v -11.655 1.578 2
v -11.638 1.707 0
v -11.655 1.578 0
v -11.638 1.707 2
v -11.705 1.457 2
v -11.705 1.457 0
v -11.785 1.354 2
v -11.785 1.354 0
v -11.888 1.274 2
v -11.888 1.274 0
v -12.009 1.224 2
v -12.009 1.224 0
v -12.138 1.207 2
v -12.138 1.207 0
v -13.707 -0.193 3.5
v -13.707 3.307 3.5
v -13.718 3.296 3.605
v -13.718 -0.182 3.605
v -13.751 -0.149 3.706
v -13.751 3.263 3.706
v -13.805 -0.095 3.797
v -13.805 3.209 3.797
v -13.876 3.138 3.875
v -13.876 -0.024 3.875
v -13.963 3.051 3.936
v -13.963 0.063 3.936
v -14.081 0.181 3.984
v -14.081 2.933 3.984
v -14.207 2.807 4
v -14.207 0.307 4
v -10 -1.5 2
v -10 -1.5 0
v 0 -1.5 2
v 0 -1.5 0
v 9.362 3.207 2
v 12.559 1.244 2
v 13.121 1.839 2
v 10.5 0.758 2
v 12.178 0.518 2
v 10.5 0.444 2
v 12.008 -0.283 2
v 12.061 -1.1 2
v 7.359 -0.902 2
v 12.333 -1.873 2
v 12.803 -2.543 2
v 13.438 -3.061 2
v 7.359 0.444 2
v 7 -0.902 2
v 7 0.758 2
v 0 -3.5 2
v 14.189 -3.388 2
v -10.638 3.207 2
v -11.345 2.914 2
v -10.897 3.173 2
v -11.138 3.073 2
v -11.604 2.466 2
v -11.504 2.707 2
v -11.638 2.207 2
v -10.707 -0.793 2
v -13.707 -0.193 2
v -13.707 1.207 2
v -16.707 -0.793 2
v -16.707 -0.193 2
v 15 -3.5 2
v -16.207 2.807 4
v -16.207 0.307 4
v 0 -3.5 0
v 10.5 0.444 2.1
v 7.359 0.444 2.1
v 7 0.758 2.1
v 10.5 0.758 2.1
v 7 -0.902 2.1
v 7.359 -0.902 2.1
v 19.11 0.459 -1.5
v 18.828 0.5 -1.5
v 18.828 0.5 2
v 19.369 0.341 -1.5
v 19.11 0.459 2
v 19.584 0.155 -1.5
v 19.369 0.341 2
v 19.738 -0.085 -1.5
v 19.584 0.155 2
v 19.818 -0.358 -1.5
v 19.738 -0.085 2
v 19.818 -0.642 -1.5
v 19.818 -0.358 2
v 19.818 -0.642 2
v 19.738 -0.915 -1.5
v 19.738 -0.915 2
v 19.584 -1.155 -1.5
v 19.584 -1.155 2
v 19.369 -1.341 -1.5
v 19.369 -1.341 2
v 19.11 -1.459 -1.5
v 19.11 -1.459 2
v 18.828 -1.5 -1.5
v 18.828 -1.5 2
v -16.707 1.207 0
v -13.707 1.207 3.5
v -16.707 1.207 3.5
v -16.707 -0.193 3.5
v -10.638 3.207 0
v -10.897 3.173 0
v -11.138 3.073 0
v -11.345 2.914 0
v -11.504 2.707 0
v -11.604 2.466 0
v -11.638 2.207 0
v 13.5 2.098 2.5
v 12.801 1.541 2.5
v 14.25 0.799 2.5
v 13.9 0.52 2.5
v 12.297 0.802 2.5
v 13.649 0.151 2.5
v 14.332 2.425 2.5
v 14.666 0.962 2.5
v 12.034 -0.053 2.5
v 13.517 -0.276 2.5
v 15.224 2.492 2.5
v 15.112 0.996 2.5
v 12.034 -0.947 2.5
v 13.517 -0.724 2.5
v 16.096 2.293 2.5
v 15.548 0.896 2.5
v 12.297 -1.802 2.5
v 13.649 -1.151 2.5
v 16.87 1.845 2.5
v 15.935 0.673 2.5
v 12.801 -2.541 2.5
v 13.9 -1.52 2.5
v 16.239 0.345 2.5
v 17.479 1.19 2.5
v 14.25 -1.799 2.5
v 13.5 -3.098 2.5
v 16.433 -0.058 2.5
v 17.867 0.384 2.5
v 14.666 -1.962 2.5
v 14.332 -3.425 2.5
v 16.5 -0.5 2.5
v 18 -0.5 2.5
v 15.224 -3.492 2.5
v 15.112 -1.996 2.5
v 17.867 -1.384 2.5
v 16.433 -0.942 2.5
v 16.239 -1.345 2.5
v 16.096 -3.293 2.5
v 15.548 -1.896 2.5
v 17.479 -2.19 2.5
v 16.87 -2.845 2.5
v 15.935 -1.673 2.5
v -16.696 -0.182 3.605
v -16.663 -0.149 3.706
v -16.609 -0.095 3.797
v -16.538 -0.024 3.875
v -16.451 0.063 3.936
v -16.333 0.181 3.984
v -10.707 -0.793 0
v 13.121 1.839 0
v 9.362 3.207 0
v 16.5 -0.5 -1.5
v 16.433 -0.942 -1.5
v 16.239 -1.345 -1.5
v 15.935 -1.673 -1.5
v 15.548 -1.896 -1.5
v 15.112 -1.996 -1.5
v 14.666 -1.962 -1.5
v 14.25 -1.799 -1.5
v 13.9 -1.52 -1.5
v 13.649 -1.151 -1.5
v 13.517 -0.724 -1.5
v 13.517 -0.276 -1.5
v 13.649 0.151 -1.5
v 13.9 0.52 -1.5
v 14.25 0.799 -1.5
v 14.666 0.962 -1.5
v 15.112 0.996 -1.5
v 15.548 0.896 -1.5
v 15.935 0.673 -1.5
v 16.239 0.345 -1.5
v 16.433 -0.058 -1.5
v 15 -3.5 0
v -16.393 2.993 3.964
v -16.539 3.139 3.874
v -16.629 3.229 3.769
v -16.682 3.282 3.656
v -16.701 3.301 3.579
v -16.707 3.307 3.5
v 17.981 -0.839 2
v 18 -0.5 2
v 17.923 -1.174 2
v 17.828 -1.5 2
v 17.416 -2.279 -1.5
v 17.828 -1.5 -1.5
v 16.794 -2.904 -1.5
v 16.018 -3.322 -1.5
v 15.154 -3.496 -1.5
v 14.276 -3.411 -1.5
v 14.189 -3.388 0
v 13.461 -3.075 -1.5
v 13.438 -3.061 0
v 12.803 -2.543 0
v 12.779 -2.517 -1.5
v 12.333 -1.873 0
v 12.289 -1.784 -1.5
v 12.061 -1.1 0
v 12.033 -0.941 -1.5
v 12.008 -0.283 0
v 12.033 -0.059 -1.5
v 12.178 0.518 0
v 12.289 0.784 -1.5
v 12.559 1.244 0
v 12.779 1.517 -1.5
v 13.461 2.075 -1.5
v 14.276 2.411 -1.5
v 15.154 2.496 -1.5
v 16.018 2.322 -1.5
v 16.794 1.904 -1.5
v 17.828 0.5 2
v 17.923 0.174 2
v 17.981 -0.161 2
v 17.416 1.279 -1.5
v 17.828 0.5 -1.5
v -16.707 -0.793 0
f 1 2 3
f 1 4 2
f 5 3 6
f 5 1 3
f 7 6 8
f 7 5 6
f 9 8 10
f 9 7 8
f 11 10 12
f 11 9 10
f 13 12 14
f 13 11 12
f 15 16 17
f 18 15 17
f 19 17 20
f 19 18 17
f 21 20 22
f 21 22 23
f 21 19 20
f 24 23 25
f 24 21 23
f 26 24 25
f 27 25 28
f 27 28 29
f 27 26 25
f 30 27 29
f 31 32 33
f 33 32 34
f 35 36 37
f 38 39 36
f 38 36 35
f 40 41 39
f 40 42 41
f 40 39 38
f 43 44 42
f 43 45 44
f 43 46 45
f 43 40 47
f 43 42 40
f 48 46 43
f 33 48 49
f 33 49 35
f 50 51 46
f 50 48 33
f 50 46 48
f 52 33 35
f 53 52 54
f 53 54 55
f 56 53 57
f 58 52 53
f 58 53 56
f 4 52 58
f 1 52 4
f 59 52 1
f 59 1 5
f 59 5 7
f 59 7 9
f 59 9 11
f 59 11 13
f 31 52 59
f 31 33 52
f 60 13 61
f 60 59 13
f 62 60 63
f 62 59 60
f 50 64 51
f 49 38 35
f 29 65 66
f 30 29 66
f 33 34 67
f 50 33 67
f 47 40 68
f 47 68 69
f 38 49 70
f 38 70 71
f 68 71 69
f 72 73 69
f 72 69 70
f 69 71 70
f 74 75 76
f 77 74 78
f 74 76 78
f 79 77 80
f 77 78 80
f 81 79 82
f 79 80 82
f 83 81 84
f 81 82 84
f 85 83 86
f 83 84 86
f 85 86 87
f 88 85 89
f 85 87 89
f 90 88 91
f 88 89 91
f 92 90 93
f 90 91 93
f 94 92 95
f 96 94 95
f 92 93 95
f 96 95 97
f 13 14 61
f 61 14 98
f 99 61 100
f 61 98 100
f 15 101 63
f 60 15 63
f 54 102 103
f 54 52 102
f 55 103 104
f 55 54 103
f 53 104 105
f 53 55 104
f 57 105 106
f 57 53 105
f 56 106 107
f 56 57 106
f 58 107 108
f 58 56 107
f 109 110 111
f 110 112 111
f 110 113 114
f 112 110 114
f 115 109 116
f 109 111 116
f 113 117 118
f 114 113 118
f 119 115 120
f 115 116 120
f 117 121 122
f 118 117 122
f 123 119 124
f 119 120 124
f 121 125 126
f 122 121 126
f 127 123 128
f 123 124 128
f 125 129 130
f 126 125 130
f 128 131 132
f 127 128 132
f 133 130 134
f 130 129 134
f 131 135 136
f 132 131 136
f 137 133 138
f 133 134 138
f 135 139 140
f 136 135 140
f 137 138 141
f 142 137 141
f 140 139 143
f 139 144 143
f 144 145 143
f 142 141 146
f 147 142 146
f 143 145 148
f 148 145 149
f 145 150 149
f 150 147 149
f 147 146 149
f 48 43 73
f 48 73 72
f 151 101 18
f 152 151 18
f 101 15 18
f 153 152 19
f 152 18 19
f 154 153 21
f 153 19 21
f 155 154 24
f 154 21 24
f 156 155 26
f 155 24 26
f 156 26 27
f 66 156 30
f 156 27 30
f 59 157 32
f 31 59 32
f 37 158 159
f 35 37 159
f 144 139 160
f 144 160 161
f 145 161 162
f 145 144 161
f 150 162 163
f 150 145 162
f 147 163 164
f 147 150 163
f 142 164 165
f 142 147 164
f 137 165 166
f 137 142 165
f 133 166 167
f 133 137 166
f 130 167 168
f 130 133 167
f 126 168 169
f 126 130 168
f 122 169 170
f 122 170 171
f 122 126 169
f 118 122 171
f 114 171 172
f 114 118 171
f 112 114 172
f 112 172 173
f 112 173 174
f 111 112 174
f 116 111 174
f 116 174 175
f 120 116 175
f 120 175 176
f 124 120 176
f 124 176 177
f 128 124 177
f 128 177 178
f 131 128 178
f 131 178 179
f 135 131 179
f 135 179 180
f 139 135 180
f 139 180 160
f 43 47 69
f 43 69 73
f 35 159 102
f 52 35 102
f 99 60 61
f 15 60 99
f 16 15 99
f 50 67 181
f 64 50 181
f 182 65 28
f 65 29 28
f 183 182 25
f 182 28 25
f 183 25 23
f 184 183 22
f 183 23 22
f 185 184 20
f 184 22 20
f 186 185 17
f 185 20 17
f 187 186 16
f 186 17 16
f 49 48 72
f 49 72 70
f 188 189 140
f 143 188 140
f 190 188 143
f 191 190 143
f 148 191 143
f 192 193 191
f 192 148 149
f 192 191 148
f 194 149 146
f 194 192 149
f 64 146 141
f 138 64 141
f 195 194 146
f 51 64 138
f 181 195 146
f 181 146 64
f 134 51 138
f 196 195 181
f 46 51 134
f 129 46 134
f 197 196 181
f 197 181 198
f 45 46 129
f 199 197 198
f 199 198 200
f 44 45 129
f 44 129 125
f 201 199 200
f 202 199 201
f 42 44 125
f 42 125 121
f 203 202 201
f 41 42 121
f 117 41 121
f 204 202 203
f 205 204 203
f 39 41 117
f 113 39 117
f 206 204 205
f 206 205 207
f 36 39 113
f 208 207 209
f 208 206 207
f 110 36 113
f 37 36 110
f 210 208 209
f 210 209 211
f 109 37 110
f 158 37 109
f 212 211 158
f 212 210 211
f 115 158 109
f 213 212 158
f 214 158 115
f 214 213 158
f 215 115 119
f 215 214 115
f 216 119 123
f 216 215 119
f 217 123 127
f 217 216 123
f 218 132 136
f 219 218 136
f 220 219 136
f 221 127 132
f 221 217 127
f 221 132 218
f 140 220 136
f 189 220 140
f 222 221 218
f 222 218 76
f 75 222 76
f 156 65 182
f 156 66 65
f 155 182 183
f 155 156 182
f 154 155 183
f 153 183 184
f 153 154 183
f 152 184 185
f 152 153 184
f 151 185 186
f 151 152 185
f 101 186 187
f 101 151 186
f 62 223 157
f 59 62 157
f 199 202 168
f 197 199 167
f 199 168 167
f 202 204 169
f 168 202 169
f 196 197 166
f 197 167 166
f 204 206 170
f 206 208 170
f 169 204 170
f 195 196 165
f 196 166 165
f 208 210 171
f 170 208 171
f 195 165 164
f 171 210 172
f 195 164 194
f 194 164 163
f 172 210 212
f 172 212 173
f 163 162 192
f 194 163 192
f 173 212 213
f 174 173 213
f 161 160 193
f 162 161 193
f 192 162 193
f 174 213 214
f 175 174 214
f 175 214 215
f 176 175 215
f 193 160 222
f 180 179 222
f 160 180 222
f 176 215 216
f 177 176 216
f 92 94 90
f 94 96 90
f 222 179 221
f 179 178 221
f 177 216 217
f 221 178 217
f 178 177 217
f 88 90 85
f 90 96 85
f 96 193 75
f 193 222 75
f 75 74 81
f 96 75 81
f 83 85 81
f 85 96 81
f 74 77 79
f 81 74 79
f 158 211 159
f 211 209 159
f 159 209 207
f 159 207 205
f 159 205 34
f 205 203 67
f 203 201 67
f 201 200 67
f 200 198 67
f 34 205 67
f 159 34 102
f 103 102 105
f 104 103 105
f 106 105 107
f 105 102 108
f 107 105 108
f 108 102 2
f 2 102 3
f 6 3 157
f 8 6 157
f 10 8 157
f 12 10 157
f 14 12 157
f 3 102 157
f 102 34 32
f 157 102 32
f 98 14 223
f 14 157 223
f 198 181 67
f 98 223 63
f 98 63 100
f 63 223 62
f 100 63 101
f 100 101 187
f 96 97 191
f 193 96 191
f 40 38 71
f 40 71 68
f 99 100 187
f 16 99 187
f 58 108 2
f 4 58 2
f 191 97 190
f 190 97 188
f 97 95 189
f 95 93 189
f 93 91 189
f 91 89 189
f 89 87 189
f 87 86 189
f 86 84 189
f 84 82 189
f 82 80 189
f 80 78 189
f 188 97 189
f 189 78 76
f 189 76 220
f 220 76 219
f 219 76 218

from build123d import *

# Parameters (mm, degrees)
ESTRUSIONE_ESTRUSIONE1_DEPTH             = 2
RACCORDO1_R                              = 1
RACCORDO2_R                              = 0.5
ESTRUSIONE_ESTRUSIONE2_DEPTH             = 2.5
ESTRUSIONE_ESTRUSIONE2_DEPTH_BACK        = 1.5
SCHIZZO2_R                               = 3
ESTRUSIONE_ESTRUSIONE3_REACH             = 20.507
ESTRUSIONE_ESTRUSIONE3_DIRECTION_2_REACH = 20.507
ESTRUSIONE_ESTRUSIONE4_DEPTH             = 3
RACCORDO3_R                              = 0.5
SCHIZZO5_R                               = 1.5
TAGLIO_ESTRUSIONE1_DEPTH                 = 21.528432045
ESTRUSIONE_ESTRUSIONE5_DEPTH             = 0.1


with BuildPart() as part:
    # Schizzo1 → Estrusione-Estrusione1 (new body)
    with BuildSketch(Plane.XY):
        Polygon((-16.707106781, 0.792893219), (-10.707106781, 0.792893219), (-10, 1.5), (0, 1.5), (0, 3.5), (15, 3.5), (15, 0), (15, -1.154985921), (9.361844275, -3.207106781), (-11.638155725, -3.207106781), (-11.638155725, -1.207106781), (-16.707106781, -1.207106781), align=None)
    extrude(amount=ESTRUSIONE_ESTRUSIONE1_DEPTH)

    # Raccordo1
    raccordo1_edges = [part.edges().sort_by_distance(p)[0] for p in [
        (-11.638155725, -3.207106781, 1),
    ]]
    fillet(raccordo1_edges, radius=RACCORDO1_R)

    # Raccordo2
    raccordo2_edges = [part.edges().sort_by_distance(p)[0] for p in [
        (-11.638155725, -1.207106781, 1),
    ]]
    fillet(raccordo2_edges, radius=RACCORDO2_R)

    # Schizzo2 → Estrusione-Estrusione2 (add, two sides: drawn at the far end of the back side and taken through both)
    with BuildSketch(Plane.XY.offset(-ESTRUSIONE_ESTRUSIONE2_DEPTH_BACK)):
        with Locations((15, 0.5)):
            Circle(SCHIZZO2_R)
    extrude(amount=ESTRUSIONE_ESTRUSIONE2_DEPTH + ESTRUSIONE_ESTRUSIONE2_DEPTH_BACK)

    # Estrusione-Estrusione3: up to this face of the body (flat: up to its plane)
    estrusione_estrusione3_end = Plane(part.part.faces().sort_by_distance((0.378494116, -0.204899382, 2))[0])
    # Schizzo3 → Estrusione-Estrusione3 (add, up to the picked face)
    with BuildSketch(Plane.XY, mode=Mode.PRIVATE) as estrusione_estrusione3_sk1:
        with BuildLine():
            Line((18.828427125, 1.5), (17.828427125, 1.5))
            ThreePointArc((17.828427125, 1.5), (18, 0.5), (17.828427125, -0.5))
            Line((17.828427125, -0.5), (18.828427125, -0.5))
            ThreePointArc((18.828427125, -0.5), (19.828427125, 0.5), (18.828427125, 1.5))
        make_face()
    estrusione_estrusione3_tool1 = split(extrude(estrusione_estrusione3_sk1.sketch, amount=ESTRUSIONE_ESTRUSIONE3_REACH, mode=Mode.PRIVATE), bisect_by=estrusione_estrusione3_end, keep=Keep.BOTH, mode=Mode.PRIVATE)
    add(estrusione_estrusione3_tool1.solids().sort_by(Axis((18.792788, 0.5, 0), (0, 0, 1)))[0])

    # Estrusione-Estrusione3 direction 2: up to this face of the body (flat: up to its plane)
    estrusione_estrusione3_direction_2_end = Plane(part.part.faces().sort_by_distance((15, 0.5, -1.5))[0])
    # Schizzo3 → Estrusione-Estrusione3 direction 2 (add, up to the picked face)
    with BuildSketch(Plane.XY, mode=Mode.PRIVATE) as estrusione_estrusione3_direction_2_sk1:
        with BuildLine():
            Line((18.828427125, 1.5), (17.828427125, 1.5))
            ThreePointArc((17.828427125, 1.5), (18, 0.5), (17.828427125, -0.5))
            Line((17.828427125, -0.5), (18.828427125, -0.5))
            ThreePointArc((18.828427125, -0.5), (19.828427125, 0.5), (18.828427125, 1.5))
        make_face()
    estrusione_estrusione3_direction_2_tool1 = split(extrude(estrusione_estrusione3_direction_2_sk1.sketch, amount=-ESTRUSIONE_ESTRUSIONE3_DIRECTION_2_REACH, mode=Mode.PRIVATE), bisect_by=estrusione_estrusione3_direction_2_end, keep=Keep.BOTH, mode=Mode.PRIVATE)
    add(estrusione_estrusione3_direction_2_tool1.solids().sort_by(Axis((18.792788, 0.5, 0), (0, 0, -1)))[0])

    # Schizzo4 → Estrusione-Estrusione4 (add)
    with BuildSketch(Plane.ZY.offset(16.707106781)):
        Polygon((2, -1.207106781), (3.5, -1.207106781), (3.5, -3.307106781), (4, -3.307106781), (4, 0.192893219), (2, 0.192893219), align=None)
    extrude(amount=-ESTRUSIONE_ESTRUSIONE4_DEPTH)

    # Raccordo3
    raccordo3_edges = [part.edges().sort_by_distance(p)[0] for p in [
        (-15.207106781, 0.192893219, 4),
        (-13.707106781, -1.557106781, 4),
        (-15.207106781, -3.307106781, 4),
        (-16.707106781, -1.557106781, 4),
    ]]
    fillet(raccordo3_edges, radius=RACCORDO3_R - 0.0001)  # a hair under: the kernel refuses the full size

    # Schizzo5 → Taglio-Estrusione1 (cut, through all)
    with BuildSketch(Plane.XY.offset(2.5)):
        with Locations((15, 0.5)):
            Circle(SCHIZZO5_R)
    extrude(amount=-TAGLIO_ESTRUSIONE1_DEPTH, mode=Mode.SUBTRACT)


with BuildPart() as body_2:
    # Specchia2: mirrored copy
    add(part.part.mirror(Plane.ZX))

    # Schizzo6 → Estrusione-Estrusione5 (add)
    with BuildSketch(Plane.XY.offset(2)):
        Polygon((10.5, 0.758388832), (10.5, 0.444286268), (7.358974359, 0.444286268), (7.358974359, -0.901867578), (7, -0.901867578), (7, 0.758388832), align=None)
    extrude(amount=ESTRUSIONE_ESTRUSIONE5_DEPTH)


solid = body_2.part
